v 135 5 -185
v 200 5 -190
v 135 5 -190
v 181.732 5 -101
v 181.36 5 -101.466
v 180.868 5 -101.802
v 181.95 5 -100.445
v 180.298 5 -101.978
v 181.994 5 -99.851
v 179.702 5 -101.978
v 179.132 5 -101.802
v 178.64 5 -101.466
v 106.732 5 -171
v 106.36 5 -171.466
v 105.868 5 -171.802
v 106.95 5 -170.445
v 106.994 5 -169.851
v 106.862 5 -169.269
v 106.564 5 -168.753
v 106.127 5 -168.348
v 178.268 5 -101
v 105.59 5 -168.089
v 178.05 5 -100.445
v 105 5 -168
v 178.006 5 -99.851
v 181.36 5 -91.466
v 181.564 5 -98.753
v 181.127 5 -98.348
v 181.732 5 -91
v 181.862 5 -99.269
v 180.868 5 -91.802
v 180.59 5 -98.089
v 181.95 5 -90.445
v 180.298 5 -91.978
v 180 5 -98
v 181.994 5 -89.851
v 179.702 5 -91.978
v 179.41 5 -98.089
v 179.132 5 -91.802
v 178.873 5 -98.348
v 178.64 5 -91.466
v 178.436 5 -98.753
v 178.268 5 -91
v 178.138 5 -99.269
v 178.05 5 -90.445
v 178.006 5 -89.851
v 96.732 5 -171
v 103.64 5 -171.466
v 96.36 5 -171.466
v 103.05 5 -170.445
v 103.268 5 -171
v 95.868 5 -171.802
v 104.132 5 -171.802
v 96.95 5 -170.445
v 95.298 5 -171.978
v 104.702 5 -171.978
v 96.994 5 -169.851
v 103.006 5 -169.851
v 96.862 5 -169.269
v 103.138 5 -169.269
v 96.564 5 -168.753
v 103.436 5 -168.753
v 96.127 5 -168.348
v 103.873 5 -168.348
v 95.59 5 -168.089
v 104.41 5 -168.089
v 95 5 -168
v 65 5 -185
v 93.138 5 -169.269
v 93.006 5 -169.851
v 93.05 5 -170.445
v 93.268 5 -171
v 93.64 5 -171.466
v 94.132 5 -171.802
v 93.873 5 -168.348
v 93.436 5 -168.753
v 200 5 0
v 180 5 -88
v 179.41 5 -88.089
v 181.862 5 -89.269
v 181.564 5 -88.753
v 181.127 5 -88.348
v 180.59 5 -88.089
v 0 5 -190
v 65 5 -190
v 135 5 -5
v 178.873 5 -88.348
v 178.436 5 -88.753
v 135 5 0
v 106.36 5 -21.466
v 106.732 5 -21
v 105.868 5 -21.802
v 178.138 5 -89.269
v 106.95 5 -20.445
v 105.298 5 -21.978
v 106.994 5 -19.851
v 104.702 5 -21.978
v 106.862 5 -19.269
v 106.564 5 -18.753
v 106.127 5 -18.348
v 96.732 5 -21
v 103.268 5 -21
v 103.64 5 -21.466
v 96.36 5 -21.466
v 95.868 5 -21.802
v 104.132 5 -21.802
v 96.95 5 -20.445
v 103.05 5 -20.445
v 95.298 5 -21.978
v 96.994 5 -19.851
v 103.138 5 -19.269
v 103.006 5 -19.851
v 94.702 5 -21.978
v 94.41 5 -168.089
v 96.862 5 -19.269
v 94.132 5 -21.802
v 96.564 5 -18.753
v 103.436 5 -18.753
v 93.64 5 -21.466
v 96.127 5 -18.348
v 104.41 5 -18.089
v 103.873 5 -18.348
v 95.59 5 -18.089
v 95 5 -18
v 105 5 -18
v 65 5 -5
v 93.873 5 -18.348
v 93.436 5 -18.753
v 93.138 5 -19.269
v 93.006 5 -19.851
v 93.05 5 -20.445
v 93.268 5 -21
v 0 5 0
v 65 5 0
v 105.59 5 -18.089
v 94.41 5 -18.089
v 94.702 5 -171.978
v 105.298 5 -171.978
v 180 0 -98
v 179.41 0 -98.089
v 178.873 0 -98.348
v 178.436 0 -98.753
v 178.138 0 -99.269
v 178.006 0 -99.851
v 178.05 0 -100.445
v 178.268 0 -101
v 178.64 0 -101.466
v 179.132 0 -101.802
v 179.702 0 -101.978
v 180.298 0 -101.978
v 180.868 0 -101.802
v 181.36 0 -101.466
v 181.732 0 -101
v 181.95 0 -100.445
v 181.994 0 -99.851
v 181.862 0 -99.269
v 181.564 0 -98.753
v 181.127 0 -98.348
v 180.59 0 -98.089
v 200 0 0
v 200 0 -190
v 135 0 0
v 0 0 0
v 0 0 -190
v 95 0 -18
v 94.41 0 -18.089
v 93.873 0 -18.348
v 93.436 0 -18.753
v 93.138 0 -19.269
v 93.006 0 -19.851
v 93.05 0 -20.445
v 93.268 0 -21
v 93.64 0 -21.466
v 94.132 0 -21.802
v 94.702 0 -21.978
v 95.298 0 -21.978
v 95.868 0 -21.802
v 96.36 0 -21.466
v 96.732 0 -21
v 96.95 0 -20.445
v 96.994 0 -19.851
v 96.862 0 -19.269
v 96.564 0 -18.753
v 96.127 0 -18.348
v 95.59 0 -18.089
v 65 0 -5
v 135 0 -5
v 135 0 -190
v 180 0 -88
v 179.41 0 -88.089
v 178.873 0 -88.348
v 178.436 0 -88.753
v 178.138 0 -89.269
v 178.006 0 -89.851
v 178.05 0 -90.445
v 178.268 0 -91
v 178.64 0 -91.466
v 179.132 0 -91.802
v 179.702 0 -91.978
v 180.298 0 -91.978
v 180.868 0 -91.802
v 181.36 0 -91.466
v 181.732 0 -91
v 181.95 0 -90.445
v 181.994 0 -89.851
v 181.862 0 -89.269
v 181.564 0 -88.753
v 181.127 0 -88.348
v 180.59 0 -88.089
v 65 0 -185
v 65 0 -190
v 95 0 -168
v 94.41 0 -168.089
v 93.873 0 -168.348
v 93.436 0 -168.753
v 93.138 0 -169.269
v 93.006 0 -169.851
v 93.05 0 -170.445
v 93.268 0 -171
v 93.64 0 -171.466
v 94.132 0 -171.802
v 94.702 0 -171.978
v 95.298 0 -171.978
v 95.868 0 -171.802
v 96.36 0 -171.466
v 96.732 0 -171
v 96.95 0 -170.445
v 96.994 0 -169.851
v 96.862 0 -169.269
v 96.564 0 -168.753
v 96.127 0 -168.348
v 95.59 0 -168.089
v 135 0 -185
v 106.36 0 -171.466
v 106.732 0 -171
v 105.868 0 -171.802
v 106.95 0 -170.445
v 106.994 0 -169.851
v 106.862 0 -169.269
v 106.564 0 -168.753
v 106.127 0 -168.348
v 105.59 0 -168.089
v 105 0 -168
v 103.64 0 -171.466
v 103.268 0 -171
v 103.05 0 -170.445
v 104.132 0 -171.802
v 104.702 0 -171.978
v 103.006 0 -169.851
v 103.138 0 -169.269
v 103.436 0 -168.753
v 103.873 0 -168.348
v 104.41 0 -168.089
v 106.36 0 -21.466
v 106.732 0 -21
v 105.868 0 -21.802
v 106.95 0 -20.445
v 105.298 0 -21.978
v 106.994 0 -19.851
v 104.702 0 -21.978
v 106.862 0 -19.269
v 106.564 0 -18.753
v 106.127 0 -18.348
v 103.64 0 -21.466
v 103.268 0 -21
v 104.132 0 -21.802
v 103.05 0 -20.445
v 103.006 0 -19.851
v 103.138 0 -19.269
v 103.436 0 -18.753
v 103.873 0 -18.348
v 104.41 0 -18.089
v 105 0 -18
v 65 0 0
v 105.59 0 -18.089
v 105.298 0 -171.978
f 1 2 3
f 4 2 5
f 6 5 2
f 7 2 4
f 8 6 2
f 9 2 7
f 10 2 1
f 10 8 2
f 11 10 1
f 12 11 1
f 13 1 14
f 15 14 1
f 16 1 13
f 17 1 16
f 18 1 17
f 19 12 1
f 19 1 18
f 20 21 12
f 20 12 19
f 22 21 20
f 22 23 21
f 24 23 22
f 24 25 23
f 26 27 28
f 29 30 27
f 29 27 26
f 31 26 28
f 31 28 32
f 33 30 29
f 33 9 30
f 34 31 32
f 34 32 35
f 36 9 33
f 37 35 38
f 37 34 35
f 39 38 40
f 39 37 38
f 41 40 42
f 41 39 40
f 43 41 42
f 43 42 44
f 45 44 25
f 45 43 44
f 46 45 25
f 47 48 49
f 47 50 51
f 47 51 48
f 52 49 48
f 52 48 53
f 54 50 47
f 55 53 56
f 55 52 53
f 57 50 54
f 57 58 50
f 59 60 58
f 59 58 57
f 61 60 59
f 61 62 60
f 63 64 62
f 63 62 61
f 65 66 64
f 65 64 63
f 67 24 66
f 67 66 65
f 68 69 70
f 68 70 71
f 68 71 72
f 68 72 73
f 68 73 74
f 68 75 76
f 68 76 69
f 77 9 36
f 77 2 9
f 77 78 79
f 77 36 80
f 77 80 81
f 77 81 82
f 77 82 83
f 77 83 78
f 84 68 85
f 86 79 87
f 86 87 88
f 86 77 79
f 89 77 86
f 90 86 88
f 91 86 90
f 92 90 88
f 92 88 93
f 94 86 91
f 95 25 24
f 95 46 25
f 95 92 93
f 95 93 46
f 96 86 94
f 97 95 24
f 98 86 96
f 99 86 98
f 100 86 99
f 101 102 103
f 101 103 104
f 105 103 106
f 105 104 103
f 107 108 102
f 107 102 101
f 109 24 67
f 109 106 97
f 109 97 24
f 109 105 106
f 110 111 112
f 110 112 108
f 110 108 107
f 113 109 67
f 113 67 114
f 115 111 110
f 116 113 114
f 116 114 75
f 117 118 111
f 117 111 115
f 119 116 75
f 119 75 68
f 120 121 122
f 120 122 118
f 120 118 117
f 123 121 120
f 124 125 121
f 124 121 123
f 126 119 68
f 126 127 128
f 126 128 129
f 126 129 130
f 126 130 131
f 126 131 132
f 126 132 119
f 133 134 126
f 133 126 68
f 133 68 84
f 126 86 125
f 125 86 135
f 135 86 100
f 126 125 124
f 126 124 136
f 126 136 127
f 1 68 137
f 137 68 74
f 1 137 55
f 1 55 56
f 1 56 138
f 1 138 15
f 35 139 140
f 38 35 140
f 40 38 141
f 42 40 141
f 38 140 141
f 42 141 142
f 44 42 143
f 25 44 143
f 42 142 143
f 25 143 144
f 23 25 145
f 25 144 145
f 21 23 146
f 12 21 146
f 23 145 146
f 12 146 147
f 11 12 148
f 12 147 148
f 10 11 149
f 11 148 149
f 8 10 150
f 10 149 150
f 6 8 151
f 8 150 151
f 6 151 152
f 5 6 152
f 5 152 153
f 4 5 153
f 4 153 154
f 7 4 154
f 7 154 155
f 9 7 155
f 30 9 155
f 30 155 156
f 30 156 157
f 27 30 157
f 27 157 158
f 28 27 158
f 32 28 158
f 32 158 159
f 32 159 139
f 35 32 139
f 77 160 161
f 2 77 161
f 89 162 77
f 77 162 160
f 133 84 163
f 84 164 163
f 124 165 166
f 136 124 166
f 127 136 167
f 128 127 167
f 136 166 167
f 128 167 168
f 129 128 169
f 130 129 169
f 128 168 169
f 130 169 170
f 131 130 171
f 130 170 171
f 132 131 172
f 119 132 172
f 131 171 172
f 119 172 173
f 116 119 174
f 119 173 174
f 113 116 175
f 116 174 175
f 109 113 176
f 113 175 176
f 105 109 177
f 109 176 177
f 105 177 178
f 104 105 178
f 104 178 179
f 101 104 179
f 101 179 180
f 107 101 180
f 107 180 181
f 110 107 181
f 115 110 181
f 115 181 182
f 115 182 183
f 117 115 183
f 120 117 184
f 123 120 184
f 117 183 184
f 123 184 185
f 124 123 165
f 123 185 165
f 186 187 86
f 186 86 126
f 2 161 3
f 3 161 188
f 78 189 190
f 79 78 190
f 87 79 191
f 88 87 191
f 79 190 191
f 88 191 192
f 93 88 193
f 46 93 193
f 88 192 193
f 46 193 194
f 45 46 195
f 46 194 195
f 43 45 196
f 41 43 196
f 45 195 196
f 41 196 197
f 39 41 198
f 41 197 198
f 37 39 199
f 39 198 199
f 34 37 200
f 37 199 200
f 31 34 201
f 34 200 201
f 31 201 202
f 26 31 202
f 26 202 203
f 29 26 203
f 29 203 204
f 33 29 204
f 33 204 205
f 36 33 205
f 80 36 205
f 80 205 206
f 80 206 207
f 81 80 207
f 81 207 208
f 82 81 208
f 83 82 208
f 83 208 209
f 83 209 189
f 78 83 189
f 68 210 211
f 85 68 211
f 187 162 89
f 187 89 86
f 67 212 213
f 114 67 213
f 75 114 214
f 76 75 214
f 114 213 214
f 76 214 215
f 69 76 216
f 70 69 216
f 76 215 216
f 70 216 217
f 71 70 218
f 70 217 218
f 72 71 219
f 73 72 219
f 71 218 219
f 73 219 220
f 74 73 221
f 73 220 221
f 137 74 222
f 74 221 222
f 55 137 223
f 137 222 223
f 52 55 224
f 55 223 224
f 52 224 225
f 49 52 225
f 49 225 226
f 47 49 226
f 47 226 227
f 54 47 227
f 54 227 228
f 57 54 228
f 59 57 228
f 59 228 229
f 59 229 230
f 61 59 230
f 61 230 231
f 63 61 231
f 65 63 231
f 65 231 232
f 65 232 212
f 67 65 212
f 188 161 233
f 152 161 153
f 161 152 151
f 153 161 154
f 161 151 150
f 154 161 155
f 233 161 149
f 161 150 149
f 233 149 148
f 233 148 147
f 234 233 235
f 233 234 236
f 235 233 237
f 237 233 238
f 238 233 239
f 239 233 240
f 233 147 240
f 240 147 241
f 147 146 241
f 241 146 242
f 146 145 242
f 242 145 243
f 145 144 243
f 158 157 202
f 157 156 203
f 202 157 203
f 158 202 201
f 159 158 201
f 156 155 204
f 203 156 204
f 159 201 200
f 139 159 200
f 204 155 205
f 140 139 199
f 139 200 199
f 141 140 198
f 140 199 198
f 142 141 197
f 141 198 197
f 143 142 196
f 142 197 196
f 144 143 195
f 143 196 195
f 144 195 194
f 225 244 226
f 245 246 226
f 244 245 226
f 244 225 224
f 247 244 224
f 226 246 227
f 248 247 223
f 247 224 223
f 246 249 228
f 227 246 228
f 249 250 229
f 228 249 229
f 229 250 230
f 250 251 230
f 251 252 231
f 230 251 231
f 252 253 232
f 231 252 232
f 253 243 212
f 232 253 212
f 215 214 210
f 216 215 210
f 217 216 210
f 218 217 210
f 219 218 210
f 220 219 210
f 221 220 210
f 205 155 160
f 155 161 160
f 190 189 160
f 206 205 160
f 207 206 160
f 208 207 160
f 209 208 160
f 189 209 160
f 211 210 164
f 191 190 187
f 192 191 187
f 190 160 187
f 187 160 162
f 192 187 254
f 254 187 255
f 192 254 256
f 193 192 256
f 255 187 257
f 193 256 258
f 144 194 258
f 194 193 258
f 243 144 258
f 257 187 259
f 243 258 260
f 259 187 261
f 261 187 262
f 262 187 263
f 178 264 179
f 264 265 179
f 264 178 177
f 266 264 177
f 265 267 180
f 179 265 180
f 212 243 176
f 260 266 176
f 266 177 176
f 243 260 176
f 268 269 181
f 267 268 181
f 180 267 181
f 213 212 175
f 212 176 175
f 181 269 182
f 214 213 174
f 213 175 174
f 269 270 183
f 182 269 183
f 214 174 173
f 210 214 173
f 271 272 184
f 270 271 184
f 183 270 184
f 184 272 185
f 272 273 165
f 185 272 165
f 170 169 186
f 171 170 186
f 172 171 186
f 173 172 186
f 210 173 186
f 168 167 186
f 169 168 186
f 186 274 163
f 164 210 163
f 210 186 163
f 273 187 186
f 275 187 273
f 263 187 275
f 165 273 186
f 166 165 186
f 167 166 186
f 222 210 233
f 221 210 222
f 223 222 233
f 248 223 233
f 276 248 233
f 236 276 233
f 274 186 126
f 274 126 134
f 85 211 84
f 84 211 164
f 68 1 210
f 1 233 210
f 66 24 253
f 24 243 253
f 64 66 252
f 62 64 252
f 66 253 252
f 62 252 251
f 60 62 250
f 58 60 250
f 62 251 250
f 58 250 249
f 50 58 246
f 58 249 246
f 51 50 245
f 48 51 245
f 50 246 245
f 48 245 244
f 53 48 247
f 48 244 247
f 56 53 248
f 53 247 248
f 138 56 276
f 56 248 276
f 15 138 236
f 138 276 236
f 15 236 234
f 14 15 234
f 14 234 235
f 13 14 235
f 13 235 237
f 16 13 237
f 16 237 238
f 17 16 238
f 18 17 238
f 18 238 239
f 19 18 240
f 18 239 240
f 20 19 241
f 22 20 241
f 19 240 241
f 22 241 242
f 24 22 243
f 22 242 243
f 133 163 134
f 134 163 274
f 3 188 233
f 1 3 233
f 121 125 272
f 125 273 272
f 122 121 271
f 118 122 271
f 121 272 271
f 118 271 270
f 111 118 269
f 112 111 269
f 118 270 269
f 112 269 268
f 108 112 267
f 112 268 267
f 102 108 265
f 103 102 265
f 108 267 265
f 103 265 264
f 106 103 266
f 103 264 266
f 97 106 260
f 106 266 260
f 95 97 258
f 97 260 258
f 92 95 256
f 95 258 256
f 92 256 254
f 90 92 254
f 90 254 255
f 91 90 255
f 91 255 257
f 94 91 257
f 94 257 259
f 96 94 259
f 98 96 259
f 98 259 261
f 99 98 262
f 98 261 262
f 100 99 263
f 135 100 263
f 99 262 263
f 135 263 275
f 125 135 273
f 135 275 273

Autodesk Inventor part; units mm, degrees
ref_plane "YZ Plane" through (0, 0, 0) normal (1, 0, 0) x (0, 1, 0)
ref_plane "XZ Plane" through (0, 0, 0) normal (0, 1, 0) x (-1, 0, 0)
ref_plane "XY Plane" through (0, 0, 0) normal (0, 0, 1) x (1, 0, 0)
sketch "Sketch1" plane through (0, 0, 0) normal (0, 1, 0) x (-1, 0, 0)
  line L0 (0, 0) -> (-200, 0)
  line L1 (-200, 0) -> (-200, -190)
  line L2 (-200, -190) -> (0, -190)
  line L3 (0, -190) -> (0, 0)
  line L4 (-65, 0) -> (-135, 0)
  line L5 (-135, 0) -> (-135, -5)
  line L6 (-135, -5) -> (-65, -5)
  line L7 (-65, -5) -> (-65, 0)
  line L8 (-200, -95) -> (0, -95) construction
  line L9 (-65, -190) -> (-135, -190)
  line L10 (-135, -190) -> (-135, -185)
  line L11 (-135, -185) -> (-65, -185)
  line L12 (-65, -185) -> (-65, -190)
  line L13 (-200, -215) -> (-200, -15)
  dimension "d0" = 200
  dimension "d2" = 70
  dimension "d3" = 5
  dimension "d11" = 0
  dimension "d13" = 190
extrude "Extrusion1" add sketch "Sketch1" along normal blind 5 contours L3 L2 L12 L11 L10 L1 L0 L5 L6 L7
sketch "Sketch2" plane through (0, 5, 0) normal (0, 1, 0) x (1, 0, 0)
  line L0 (0, 0) -> (65, 0) projected
  line L1 (135, 0) -> (200, 0) projected
  line L2 (65, 0) -> (65, 5) projected
  line L3 (0, 190) -> (0, 0) projected
  line L4 (0, 95) -> (200, 95)
  point P0 (95, 20)
  point P1 (105, 20)
  point P2 (95, 170)
  point P3 (105, 170)
  dimension "d22" = 20
  dimension "d23" = 10
  dimension "d24" = 20
  dimension "d25" = 30
hole "Hole1" at (95, 5, -20) at (105, 5, -20) at (95, 5, -170) at (105, 5, -170) direction (0, -1, 0) diameter 4 end through all
sketch "Sketch5" plane through (0, 5, 0) normal (0, 1, 0) x (1, 0, 0)
  line L0 (200, 0) -> (200, 190) projected
  line L1 (200, 190) -> (135, 190) projected
  point P0 (0, 0)
  point P1 (180, 90)
  point P2 (180, 100)
  dimension "d51" = 20
  dimension "d52" = 20
  dimension "d53" = 10
  dimension "d54" = 90
hole "Hole4" at (180, 5, -90) at (180, 5, -100) direction (0, -1, 0) diameter 4 end through all
properties part number "top"
